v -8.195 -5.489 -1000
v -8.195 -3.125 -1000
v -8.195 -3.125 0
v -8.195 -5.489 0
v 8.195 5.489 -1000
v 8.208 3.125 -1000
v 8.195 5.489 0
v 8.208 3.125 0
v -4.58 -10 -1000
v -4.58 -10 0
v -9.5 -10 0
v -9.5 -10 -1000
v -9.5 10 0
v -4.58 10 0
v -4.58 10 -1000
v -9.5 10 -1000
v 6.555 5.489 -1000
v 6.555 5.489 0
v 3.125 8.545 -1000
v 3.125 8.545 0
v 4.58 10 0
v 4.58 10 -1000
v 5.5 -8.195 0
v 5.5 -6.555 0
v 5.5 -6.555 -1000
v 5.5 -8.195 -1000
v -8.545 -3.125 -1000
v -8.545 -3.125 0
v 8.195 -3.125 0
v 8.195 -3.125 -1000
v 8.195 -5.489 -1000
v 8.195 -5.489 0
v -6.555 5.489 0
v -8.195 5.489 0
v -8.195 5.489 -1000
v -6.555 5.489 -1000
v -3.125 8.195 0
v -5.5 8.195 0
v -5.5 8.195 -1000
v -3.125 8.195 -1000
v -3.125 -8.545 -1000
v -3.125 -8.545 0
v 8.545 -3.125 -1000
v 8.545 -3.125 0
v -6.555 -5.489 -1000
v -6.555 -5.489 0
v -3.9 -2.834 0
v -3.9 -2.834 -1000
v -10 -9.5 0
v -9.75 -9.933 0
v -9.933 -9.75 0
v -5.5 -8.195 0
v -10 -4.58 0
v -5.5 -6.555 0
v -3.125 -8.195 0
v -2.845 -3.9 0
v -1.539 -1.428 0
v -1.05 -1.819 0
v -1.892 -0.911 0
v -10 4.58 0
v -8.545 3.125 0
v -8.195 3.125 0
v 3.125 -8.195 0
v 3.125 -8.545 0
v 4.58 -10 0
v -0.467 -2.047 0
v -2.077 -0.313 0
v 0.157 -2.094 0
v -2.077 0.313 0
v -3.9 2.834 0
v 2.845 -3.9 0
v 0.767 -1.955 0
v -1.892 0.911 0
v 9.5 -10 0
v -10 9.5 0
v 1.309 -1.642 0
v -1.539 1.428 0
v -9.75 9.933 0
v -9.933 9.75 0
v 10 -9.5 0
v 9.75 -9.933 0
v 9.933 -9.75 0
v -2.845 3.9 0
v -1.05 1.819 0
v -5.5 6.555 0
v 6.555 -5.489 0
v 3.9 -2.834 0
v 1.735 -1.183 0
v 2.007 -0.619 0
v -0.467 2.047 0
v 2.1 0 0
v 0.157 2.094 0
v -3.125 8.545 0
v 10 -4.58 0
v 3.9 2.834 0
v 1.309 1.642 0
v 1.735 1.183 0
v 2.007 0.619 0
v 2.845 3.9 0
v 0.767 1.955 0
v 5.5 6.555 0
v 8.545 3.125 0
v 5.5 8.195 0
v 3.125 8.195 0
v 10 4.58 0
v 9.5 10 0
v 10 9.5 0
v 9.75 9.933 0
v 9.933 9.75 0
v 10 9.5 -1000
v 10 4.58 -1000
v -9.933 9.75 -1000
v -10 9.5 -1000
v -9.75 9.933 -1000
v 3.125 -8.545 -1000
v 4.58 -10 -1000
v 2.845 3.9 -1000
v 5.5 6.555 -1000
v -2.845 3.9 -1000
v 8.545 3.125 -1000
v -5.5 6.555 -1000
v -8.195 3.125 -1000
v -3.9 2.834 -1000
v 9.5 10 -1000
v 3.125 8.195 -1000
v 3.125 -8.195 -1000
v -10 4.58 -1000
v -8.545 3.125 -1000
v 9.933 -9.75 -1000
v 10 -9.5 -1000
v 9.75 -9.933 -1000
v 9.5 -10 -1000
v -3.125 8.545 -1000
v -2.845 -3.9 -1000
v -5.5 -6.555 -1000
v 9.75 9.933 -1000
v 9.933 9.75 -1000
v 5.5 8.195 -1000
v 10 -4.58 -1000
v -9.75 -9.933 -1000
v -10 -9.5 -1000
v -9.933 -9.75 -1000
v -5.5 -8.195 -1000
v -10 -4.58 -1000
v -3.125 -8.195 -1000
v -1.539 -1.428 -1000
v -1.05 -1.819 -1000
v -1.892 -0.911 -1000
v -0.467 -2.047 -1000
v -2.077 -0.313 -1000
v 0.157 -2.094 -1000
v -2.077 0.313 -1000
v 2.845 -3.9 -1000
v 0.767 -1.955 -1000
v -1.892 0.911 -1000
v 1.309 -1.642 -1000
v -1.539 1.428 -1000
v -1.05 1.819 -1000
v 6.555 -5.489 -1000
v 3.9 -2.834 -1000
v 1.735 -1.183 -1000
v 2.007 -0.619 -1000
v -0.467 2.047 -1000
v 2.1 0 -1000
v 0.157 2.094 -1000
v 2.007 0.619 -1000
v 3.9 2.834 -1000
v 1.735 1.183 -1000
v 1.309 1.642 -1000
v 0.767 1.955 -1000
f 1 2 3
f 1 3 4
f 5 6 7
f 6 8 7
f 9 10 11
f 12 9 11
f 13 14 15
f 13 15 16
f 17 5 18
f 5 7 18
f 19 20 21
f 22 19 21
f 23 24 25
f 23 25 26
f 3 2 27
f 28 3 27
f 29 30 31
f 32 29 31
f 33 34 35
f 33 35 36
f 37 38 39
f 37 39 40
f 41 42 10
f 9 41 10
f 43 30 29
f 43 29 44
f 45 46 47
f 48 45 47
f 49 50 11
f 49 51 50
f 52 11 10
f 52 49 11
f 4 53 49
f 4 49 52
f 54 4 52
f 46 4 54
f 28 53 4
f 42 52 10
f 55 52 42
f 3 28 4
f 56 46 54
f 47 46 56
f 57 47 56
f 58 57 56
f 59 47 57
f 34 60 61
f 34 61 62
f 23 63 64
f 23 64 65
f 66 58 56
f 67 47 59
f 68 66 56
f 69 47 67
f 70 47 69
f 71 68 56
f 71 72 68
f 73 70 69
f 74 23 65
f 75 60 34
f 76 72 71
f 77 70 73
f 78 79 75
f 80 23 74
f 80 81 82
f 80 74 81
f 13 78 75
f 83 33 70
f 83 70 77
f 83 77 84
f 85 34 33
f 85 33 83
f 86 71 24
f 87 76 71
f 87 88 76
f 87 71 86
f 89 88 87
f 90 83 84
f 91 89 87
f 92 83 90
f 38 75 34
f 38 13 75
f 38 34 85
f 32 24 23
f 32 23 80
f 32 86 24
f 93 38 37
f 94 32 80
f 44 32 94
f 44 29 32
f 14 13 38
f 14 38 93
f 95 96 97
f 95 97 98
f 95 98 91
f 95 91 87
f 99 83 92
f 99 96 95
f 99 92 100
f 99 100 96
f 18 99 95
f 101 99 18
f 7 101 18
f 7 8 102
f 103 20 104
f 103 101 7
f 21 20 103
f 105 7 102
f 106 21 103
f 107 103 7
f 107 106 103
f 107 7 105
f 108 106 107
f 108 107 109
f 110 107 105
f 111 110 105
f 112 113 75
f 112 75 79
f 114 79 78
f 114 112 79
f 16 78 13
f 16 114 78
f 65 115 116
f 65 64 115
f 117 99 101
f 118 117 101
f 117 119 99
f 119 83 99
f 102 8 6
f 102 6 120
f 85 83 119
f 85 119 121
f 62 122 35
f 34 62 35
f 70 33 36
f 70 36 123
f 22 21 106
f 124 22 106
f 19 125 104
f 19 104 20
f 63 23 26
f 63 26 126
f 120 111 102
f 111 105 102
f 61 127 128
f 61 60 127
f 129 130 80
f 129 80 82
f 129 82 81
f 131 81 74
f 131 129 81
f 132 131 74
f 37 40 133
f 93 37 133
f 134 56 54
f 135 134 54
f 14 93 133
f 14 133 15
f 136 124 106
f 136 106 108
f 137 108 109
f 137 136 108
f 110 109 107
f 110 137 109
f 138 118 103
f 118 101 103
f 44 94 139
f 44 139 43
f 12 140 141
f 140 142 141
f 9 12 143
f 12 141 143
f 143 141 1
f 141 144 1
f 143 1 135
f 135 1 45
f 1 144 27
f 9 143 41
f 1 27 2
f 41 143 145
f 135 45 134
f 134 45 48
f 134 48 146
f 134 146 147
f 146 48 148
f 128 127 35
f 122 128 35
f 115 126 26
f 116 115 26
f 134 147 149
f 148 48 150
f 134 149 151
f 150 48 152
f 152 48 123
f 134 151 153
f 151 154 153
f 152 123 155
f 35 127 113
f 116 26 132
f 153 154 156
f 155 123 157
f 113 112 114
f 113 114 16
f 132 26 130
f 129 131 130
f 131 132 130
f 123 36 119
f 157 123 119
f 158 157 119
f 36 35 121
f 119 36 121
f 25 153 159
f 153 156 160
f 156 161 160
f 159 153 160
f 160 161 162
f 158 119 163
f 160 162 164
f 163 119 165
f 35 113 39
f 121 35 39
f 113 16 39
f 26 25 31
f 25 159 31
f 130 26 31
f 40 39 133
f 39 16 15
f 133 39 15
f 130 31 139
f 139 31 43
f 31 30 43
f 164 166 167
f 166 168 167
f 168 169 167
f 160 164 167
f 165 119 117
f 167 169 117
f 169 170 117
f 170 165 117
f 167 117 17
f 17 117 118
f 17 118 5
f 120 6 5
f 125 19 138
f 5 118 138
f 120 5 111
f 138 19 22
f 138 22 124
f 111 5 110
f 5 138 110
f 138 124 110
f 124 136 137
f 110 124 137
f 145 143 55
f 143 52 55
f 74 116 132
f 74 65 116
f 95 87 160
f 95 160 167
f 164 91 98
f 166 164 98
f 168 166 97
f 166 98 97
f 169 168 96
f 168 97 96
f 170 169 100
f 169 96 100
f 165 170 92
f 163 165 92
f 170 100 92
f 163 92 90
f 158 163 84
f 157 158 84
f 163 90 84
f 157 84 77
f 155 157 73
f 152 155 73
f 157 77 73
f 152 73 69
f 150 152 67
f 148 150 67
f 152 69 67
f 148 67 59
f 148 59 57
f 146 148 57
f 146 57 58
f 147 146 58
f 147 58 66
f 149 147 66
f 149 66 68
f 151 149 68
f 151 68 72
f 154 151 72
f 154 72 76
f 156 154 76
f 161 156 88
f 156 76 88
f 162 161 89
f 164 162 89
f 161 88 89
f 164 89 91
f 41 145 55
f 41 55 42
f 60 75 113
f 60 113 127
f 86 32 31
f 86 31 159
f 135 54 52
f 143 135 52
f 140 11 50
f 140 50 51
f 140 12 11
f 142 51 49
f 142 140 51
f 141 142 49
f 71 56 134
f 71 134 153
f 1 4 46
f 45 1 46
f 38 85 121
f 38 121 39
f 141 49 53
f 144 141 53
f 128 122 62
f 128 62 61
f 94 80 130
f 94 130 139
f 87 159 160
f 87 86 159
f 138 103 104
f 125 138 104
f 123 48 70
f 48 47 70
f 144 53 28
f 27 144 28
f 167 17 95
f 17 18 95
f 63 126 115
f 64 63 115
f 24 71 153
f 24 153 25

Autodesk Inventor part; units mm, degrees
ref_plane "YZ Plane" through (0, 0, 0) normal (1, 0, 0) x (0, 1, 0)
ref_plane "XZ Plane" through (0, 0, 0) normal (0, 1, 0) x (-1, 0, 0)
ref_plane "XY Plane" through (0, 0, 0) normal (0, 0, 1) x (1, 0, 0)
sketch "Boceto1" plane through (0, 0, 0) normal (0, 0, 1) x (1, 0, 0)
  circle A0 centre (0, 0) radius 2.1
  line L0 (-12, 0) -> (12, 0)
  line L1 (0, 12) -> (0, -12)
  line L2 (0, 3.9) -> (-2.845, 3.9)
  line L3 (-2.845, 3.9) -> (-5.5, 6.555)
  line L4 (-5.5, 6.555) -> (-5.5, 8.195)
  line L5 (-5.5, 8.195) -> (-3.125, 8.195)
  line L6 (-3.125, 8.545) -> (-4.58, 10)
  line L7 (-4.58, 10) -> (-10, 10)
  line L8 (-10, 10) -> (-10, 4.58)
  line L9 (-10, 4.58) -> (-8.545, 3.125)
  line L10 (-8.195, 3.125) -> (-8.195, 5.4887)
  line L11 (-8.195, 5.4887) -> (-6.555, 5.4887)
  line L12 (-6.555, 5.4887) -> (-3.9, 2.8337)
  line L13 (-3.9, 2.8337) -> (-3.9, 0)
  line L14 (0, 3.9) -> (2.845, 3.9)
  line L15 (2.845, 3.9) -> (5.5, 6.555)
  line L16 (5.5, 6.555) -> (5.5, 8.195)
  line L17 (5.5, 8.195) -> (3.125, 8.195)
  line L18 (3.125, 8.545) -> (4.58, 10)
  line L19 (4.58, 10) -> (10, 10)
  line L20 (10, 10) -> (10, 4.58)
  line L21 (10, 4.58) -> (8.545, 3.125)
  line L22 (8.2079, 3.125) -> (8.195, 5.4887)
  line L23 (8.195, 5.4887) -> (6.555, 5.4887)
  line L24 (6.555, 5.4887) -> (3.9, 2.8337)
  line L25 (3.9, 2.8337) -> (3.9, 0)
  line L26 (0, -3.9) -> (-2.845, -3.9)
  line L27 (-2.845, -3.9) -> (-5.5, -6.555)
  line L28 (-5.5, -6.555) -> (-5.5, -8.195)
  line L29 (-5.5, -8.195) -> (-3.125, -8.195)
  line L30 (-3.125, -8.545) -> (-4.58, -10)
  line L31 (-4.58, -10) -> (-10, -10)
  line L32 (-10, -10) -> (-10, -4.58)
  line L33 (-10, -4.58) -> (-8.545, -3.125)
  line L34 (-8.195, -3.125) -> (-8.195, -5.4887)
  line L35 (-8.195, -5.4887) -> (-6.555, -5.4887)
  line L36 (-6.555, -5.4887) -> (-3.9, -2.8337)
  line L37 (-3.9, -2.8337) -> (-3.9, 0)
  line L38 (10, -10) -> (10, -4.58)
  line L39 (4.58, -10) -> (10, -10)
  line L40 (3.125, -8.545) -> (4.58, -10)
  line L41 (5.5, -8.195) -> (3.125, -8.195)
  line L42 (5.5, -6.555) -> (5.5, -8.195)
  line L43 (2.845, -3.9) -> (5.5, -6.555)
  line L44 (0, -3.9) -> (2.845, -3.9)
  line L45 (3.9, -2.8337) -> (3.9, 0)
  line L46 (6.555, -5.4887) -> (3.9, -2.8337)
  line L47 (8.195, -5.4887) -> (6.555, -5.4887)
  line L48 (8.195, -3.125) -> (8.195, -5.4887)
  line L49 (10, -4.58) -> (8.545, -3.125)
  line L50 (-3.125, 8.195) -> (-3.125, 8.545)
  line L51 (-8.195, 3.125) -> (-8.545, 3.125)
  line L52 (3.125, 8.195) -> (3.125, 8.545)
  line L53 (8.195, 3.125) -> (8.545, 3.125)
  line L54 (-3.125, -8.195) -> (-3.125, -8.545)
  line L55 (-8.195, -3.125) -> (-8.545, -3.125)
  line L56 (3.125, -8.195) -> (3.125, -8.545)
  line L57 (8.195, -3.125) -> (8.545, -3.125)
  dimension "d0" = 4.2
  dimension "d1" = 24
  dimension "d2" = 24
  dimension "d3" = 90
  dimension "d5" = 20
  dimension "d11" = 90
  dimension "d18" = 20
  dimension "d29" = 1.5
  dimension "d30" = 1.64
  dimension "d37" = 1.64
  dimension "d42" = 7.8
  dimension "d44" = 11
  dimension "d45" = 9.16
  dimension "d46" = 9.16
  dimension "d47" = 6.25
  dimension "d48" = 6.25
  dimension "d49" = 0.35
  dimension "d51" = 7.8
  dimension "d52" = 0.35
  dimension "d53" = 1.8
extrude "Extrusión1" add sketch "Boceto1" against normal blind 1000 contours L0 L45 L46 L47 L48 L57 L49 L38 L39 L40 L56 L41 L42 L43 L44 L1 A0 | A0 L1 L14 L15 L16 L17 L52 L18 L19 L20 L21 L53 L22 L23 L24 L25 L0 | A0 L0 L13 L12 L11 L10 L51 L9 L8 L7 L6 L50 L5 L4 L3 L2 L1 | L1 L26 L27 L28 L29 L54 L30 L31 L32 L33 L55 L34 L35 L36 L37 L0 A0
fillet "Empalme1" radius 0.5 4 edges at (10, 10, -500) (-10, 10, -500) (10, -10, -500) (-10, -10, -500)
properties part number "Perfil20201meter" material "Aluminio 6061"
